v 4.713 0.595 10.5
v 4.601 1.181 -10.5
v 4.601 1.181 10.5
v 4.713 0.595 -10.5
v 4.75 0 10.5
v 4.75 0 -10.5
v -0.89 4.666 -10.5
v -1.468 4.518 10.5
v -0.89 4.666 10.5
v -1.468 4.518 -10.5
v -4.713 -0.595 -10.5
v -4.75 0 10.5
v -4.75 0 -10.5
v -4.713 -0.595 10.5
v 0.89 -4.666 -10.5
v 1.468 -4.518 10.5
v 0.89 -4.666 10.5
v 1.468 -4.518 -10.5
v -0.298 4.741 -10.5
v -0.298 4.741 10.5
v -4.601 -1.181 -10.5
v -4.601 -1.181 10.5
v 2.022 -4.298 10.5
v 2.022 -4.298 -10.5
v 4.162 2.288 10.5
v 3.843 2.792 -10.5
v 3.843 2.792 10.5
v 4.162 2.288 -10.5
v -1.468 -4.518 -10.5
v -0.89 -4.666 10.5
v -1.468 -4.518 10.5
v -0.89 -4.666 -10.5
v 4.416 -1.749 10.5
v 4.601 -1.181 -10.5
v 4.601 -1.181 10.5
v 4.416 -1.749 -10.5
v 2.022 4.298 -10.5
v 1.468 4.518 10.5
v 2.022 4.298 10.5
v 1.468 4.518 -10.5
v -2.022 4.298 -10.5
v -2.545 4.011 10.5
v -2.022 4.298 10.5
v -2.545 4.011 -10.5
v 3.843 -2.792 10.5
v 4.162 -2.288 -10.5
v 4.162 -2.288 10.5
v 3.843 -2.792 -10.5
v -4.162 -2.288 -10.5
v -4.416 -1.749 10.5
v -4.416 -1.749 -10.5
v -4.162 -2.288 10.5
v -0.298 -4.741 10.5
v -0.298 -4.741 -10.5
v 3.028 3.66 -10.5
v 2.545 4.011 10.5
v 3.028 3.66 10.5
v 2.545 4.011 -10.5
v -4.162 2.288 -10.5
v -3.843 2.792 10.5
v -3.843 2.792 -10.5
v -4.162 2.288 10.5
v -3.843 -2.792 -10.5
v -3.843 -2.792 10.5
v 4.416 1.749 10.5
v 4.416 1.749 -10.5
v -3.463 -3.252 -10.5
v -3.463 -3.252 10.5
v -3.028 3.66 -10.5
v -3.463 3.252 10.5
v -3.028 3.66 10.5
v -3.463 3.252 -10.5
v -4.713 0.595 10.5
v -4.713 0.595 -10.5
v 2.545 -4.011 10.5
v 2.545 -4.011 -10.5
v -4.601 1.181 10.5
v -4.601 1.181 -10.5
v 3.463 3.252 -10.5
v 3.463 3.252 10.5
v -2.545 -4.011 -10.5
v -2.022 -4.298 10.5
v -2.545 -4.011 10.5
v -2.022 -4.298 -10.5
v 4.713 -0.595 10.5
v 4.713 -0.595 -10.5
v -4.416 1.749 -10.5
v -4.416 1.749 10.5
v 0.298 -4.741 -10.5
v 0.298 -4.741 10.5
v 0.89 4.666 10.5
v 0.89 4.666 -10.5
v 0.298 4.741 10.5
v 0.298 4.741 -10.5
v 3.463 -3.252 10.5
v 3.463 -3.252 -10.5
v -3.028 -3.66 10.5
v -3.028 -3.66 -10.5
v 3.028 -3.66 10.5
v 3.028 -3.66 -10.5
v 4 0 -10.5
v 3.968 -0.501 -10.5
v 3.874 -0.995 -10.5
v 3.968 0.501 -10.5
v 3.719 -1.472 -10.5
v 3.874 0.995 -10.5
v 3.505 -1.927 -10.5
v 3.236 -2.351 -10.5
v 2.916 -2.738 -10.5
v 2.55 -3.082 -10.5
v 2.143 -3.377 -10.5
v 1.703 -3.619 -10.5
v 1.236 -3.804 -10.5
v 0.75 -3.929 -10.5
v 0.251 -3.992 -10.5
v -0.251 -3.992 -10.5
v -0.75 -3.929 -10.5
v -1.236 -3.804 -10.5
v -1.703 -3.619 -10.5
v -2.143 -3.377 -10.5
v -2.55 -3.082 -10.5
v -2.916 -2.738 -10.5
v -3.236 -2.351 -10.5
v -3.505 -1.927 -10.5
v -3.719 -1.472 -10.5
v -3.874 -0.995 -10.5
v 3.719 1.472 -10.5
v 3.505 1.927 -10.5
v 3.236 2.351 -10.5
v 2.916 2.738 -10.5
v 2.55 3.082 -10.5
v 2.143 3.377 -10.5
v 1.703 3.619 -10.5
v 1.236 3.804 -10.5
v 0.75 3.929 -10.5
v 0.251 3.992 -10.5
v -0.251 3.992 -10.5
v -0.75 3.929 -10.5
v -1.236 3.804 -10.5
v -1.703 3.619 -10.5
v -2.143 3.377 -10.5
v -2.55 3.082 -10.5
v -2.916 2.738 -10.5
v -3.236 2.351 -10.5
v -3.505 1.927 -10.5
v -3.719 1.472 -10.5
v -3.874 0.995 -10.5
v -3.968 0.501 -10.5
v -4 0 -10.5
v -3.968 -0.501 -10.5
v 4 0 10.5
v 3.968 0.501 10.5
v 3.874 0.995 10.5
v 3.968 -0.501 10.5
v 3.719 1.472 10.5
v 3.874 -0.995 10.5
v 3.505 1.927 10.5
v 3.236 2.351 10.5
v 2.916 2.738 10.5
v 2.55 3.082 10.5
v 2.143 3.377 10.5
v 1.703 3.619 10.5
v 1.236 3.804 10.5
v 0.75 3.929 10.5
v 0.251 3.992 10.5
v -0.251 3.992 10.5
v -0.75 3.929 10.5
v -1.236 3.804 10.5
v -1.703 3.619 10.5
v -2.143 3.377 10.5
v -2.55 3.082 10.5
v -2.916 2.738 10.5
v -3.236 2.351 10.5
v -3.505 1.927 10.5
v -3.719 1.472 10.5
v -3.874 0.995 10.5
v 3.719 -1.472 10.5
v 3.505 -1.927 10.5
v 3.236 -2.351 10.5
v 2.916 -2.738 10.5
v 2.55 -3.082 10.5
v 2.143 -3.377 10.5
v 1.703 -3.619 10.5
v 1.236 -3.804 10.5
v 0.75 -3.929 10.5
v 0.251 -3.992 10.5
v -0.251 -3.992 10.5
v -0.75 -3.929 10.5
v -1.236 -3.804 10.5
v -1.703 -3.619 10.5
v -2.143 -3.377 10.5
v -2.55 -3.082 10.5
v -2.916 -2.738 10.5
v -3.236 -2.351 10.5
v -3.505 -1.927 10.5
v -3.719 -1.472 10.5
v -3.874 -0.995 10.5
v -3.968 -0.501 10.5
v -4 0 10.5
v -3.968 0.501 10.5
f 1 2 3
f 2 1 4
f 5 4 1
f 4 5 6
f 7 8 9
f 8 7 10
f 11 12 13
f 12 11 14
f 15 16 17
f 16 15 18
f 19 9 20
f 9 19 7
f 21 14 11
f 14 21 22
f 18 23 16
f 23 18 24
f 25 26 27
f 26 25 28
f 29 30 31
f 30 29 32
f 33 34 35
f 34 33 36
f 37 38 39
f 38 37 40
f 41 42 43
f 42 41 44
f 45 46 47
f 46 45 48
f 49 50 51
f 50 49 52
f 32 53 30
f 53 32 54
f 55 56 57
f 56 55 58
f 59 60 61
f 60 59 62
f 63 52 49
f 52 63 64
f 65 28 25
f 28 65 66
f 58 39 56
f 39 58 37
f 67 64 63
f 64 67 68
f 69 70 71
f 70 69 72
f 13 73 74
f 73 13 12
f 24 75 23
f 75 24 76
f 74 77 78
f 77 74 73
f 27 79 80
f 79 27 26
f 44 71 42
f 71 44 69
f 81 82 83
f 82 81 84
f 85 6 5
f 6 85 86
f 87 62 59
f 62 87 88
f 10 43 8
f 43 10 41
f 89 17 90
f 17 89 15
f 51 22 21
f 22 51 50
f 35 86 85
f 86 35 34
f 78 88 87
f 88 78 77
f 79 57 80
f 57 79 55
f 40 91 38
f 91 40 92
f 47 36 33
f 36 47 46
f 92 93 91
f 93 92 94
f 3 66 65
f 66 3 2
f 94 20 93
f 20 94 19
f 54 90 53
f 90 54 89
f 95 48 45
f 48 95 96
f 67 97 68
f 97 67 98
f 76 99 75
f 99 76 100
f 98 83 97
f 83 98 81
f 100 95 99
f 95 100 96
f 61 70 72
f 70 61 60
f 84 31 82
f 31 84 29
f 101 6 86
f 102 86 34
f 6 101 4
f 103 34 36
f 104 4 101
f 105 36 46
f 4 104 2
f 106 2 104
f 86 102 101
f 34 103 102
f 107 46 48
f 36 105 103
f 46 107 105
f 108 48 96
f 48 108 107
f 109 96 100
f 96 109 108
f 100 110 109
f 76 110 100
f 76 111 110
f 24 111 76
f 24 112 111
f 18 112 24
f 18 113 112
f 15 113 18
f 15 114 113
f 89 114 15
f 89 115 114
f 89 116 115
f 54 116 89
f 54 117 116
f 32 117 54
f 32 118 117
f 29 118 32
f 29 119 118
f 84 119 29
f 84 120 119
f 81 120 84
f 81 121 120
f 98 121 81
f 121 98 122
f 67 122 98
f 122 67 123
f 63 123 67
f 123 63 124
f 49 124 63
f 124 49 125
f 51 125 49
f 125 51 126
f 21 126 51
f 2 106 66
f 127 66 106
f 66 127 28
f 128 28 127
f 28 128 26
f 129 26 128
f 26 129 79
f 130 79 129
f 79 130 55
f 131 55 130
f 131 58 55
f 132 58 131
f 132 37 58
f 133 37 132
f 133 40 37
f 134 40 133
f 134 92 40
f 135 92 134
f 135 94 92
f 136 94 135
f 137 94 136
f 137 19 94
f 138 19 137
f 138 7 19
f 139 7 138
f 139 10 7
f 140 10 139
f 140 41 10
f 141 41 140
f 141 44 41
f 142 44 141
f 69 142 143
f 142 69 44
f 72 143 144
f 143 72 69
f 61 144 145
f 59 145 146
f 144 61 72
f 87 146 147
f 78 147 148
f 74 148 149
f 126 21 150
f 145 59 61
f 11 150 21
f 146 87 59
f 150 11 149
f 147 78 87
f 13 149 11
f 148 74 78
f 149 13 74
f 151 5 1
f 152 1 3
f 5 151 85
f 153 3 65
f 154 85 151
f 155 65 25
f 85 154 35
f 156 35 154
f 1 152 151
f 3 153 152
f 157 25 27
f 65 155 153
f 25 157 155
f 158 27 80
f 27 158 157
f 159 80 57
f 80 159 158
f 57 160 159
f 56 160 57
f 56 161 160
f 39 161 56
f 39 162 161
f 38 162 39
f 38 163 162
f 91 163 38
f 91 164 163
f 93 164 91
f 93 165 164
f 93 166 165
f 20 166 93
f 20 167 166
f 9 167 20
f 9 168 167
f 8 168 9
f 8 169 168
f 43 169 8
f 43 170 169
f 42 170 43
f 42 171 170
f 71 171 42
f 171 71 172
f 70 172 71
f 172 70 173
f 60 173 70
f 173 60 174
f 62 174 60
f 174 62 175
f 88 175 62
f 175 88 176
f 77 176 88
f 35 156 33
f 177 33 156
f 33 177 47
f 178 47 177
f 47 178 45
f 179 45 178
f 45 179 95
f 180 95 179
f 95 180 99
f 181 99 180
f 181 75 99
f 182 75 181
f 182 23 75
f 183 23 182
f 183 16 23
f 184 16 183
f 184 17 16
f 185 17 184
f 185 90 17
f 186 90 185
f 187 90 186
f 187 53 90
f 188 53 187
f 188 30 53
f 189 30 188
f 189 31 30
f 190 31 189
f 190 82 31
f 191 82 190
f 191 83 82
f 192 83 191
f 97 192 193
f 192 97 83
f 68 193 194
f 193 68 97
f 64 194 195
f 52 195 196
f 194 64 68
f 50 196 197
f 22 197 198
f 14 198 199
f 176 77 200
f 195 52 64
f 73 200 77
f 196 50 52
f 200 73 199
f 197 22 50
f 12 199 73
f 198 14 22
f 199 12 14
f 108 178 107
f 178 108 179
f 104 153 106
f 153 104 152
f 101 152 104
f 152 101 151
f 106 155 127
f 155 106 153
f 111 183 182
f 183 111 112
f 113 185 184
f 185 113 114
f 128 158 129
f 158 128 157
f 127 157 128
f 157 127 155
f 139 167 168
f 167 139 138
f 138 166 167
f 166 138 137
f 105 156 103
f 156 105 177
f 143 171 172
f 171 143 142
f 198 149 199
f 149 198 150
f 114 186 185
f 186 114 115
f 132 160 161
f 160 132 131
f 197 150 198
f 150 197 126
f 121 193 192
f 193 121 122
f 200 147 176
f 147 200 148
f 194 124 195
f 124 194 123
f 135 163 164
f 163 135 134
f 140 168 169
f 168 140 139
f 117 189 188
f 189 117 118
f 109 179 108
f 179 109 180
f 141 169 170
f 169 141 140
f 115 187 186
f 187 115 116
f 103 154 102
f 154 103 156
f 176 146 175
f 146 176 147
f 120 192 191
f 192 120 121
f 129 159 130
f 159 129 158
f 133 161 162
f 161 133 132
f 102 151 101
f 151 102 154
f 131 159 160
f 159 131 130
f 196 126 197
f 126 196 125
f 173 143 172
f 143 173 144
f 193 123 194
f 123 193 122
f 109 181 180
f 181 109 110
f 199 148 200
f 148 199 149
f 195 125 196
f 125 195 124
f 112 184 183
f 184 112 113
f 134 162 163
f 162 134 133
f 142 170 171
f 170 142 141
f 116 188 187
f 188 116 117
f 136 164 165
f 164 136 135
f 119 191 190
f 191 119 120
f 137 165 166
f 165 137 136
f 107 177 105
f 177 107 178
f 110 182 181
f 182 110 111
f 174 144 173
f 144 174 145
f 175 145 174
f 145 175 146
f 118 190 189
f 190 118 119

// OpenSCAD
$fn = 50;


difference() {
	union() {
		translate(v = [0, 0, -10.5000000000]) {
			cylinder(h = 21, r = 4.7500000000);
		}
	}
	union() {
		translate(v = [0, 0, -100.0000000000]) {
			cylinder(h = 200, r = 4.0000000000);
		}
	}
}
